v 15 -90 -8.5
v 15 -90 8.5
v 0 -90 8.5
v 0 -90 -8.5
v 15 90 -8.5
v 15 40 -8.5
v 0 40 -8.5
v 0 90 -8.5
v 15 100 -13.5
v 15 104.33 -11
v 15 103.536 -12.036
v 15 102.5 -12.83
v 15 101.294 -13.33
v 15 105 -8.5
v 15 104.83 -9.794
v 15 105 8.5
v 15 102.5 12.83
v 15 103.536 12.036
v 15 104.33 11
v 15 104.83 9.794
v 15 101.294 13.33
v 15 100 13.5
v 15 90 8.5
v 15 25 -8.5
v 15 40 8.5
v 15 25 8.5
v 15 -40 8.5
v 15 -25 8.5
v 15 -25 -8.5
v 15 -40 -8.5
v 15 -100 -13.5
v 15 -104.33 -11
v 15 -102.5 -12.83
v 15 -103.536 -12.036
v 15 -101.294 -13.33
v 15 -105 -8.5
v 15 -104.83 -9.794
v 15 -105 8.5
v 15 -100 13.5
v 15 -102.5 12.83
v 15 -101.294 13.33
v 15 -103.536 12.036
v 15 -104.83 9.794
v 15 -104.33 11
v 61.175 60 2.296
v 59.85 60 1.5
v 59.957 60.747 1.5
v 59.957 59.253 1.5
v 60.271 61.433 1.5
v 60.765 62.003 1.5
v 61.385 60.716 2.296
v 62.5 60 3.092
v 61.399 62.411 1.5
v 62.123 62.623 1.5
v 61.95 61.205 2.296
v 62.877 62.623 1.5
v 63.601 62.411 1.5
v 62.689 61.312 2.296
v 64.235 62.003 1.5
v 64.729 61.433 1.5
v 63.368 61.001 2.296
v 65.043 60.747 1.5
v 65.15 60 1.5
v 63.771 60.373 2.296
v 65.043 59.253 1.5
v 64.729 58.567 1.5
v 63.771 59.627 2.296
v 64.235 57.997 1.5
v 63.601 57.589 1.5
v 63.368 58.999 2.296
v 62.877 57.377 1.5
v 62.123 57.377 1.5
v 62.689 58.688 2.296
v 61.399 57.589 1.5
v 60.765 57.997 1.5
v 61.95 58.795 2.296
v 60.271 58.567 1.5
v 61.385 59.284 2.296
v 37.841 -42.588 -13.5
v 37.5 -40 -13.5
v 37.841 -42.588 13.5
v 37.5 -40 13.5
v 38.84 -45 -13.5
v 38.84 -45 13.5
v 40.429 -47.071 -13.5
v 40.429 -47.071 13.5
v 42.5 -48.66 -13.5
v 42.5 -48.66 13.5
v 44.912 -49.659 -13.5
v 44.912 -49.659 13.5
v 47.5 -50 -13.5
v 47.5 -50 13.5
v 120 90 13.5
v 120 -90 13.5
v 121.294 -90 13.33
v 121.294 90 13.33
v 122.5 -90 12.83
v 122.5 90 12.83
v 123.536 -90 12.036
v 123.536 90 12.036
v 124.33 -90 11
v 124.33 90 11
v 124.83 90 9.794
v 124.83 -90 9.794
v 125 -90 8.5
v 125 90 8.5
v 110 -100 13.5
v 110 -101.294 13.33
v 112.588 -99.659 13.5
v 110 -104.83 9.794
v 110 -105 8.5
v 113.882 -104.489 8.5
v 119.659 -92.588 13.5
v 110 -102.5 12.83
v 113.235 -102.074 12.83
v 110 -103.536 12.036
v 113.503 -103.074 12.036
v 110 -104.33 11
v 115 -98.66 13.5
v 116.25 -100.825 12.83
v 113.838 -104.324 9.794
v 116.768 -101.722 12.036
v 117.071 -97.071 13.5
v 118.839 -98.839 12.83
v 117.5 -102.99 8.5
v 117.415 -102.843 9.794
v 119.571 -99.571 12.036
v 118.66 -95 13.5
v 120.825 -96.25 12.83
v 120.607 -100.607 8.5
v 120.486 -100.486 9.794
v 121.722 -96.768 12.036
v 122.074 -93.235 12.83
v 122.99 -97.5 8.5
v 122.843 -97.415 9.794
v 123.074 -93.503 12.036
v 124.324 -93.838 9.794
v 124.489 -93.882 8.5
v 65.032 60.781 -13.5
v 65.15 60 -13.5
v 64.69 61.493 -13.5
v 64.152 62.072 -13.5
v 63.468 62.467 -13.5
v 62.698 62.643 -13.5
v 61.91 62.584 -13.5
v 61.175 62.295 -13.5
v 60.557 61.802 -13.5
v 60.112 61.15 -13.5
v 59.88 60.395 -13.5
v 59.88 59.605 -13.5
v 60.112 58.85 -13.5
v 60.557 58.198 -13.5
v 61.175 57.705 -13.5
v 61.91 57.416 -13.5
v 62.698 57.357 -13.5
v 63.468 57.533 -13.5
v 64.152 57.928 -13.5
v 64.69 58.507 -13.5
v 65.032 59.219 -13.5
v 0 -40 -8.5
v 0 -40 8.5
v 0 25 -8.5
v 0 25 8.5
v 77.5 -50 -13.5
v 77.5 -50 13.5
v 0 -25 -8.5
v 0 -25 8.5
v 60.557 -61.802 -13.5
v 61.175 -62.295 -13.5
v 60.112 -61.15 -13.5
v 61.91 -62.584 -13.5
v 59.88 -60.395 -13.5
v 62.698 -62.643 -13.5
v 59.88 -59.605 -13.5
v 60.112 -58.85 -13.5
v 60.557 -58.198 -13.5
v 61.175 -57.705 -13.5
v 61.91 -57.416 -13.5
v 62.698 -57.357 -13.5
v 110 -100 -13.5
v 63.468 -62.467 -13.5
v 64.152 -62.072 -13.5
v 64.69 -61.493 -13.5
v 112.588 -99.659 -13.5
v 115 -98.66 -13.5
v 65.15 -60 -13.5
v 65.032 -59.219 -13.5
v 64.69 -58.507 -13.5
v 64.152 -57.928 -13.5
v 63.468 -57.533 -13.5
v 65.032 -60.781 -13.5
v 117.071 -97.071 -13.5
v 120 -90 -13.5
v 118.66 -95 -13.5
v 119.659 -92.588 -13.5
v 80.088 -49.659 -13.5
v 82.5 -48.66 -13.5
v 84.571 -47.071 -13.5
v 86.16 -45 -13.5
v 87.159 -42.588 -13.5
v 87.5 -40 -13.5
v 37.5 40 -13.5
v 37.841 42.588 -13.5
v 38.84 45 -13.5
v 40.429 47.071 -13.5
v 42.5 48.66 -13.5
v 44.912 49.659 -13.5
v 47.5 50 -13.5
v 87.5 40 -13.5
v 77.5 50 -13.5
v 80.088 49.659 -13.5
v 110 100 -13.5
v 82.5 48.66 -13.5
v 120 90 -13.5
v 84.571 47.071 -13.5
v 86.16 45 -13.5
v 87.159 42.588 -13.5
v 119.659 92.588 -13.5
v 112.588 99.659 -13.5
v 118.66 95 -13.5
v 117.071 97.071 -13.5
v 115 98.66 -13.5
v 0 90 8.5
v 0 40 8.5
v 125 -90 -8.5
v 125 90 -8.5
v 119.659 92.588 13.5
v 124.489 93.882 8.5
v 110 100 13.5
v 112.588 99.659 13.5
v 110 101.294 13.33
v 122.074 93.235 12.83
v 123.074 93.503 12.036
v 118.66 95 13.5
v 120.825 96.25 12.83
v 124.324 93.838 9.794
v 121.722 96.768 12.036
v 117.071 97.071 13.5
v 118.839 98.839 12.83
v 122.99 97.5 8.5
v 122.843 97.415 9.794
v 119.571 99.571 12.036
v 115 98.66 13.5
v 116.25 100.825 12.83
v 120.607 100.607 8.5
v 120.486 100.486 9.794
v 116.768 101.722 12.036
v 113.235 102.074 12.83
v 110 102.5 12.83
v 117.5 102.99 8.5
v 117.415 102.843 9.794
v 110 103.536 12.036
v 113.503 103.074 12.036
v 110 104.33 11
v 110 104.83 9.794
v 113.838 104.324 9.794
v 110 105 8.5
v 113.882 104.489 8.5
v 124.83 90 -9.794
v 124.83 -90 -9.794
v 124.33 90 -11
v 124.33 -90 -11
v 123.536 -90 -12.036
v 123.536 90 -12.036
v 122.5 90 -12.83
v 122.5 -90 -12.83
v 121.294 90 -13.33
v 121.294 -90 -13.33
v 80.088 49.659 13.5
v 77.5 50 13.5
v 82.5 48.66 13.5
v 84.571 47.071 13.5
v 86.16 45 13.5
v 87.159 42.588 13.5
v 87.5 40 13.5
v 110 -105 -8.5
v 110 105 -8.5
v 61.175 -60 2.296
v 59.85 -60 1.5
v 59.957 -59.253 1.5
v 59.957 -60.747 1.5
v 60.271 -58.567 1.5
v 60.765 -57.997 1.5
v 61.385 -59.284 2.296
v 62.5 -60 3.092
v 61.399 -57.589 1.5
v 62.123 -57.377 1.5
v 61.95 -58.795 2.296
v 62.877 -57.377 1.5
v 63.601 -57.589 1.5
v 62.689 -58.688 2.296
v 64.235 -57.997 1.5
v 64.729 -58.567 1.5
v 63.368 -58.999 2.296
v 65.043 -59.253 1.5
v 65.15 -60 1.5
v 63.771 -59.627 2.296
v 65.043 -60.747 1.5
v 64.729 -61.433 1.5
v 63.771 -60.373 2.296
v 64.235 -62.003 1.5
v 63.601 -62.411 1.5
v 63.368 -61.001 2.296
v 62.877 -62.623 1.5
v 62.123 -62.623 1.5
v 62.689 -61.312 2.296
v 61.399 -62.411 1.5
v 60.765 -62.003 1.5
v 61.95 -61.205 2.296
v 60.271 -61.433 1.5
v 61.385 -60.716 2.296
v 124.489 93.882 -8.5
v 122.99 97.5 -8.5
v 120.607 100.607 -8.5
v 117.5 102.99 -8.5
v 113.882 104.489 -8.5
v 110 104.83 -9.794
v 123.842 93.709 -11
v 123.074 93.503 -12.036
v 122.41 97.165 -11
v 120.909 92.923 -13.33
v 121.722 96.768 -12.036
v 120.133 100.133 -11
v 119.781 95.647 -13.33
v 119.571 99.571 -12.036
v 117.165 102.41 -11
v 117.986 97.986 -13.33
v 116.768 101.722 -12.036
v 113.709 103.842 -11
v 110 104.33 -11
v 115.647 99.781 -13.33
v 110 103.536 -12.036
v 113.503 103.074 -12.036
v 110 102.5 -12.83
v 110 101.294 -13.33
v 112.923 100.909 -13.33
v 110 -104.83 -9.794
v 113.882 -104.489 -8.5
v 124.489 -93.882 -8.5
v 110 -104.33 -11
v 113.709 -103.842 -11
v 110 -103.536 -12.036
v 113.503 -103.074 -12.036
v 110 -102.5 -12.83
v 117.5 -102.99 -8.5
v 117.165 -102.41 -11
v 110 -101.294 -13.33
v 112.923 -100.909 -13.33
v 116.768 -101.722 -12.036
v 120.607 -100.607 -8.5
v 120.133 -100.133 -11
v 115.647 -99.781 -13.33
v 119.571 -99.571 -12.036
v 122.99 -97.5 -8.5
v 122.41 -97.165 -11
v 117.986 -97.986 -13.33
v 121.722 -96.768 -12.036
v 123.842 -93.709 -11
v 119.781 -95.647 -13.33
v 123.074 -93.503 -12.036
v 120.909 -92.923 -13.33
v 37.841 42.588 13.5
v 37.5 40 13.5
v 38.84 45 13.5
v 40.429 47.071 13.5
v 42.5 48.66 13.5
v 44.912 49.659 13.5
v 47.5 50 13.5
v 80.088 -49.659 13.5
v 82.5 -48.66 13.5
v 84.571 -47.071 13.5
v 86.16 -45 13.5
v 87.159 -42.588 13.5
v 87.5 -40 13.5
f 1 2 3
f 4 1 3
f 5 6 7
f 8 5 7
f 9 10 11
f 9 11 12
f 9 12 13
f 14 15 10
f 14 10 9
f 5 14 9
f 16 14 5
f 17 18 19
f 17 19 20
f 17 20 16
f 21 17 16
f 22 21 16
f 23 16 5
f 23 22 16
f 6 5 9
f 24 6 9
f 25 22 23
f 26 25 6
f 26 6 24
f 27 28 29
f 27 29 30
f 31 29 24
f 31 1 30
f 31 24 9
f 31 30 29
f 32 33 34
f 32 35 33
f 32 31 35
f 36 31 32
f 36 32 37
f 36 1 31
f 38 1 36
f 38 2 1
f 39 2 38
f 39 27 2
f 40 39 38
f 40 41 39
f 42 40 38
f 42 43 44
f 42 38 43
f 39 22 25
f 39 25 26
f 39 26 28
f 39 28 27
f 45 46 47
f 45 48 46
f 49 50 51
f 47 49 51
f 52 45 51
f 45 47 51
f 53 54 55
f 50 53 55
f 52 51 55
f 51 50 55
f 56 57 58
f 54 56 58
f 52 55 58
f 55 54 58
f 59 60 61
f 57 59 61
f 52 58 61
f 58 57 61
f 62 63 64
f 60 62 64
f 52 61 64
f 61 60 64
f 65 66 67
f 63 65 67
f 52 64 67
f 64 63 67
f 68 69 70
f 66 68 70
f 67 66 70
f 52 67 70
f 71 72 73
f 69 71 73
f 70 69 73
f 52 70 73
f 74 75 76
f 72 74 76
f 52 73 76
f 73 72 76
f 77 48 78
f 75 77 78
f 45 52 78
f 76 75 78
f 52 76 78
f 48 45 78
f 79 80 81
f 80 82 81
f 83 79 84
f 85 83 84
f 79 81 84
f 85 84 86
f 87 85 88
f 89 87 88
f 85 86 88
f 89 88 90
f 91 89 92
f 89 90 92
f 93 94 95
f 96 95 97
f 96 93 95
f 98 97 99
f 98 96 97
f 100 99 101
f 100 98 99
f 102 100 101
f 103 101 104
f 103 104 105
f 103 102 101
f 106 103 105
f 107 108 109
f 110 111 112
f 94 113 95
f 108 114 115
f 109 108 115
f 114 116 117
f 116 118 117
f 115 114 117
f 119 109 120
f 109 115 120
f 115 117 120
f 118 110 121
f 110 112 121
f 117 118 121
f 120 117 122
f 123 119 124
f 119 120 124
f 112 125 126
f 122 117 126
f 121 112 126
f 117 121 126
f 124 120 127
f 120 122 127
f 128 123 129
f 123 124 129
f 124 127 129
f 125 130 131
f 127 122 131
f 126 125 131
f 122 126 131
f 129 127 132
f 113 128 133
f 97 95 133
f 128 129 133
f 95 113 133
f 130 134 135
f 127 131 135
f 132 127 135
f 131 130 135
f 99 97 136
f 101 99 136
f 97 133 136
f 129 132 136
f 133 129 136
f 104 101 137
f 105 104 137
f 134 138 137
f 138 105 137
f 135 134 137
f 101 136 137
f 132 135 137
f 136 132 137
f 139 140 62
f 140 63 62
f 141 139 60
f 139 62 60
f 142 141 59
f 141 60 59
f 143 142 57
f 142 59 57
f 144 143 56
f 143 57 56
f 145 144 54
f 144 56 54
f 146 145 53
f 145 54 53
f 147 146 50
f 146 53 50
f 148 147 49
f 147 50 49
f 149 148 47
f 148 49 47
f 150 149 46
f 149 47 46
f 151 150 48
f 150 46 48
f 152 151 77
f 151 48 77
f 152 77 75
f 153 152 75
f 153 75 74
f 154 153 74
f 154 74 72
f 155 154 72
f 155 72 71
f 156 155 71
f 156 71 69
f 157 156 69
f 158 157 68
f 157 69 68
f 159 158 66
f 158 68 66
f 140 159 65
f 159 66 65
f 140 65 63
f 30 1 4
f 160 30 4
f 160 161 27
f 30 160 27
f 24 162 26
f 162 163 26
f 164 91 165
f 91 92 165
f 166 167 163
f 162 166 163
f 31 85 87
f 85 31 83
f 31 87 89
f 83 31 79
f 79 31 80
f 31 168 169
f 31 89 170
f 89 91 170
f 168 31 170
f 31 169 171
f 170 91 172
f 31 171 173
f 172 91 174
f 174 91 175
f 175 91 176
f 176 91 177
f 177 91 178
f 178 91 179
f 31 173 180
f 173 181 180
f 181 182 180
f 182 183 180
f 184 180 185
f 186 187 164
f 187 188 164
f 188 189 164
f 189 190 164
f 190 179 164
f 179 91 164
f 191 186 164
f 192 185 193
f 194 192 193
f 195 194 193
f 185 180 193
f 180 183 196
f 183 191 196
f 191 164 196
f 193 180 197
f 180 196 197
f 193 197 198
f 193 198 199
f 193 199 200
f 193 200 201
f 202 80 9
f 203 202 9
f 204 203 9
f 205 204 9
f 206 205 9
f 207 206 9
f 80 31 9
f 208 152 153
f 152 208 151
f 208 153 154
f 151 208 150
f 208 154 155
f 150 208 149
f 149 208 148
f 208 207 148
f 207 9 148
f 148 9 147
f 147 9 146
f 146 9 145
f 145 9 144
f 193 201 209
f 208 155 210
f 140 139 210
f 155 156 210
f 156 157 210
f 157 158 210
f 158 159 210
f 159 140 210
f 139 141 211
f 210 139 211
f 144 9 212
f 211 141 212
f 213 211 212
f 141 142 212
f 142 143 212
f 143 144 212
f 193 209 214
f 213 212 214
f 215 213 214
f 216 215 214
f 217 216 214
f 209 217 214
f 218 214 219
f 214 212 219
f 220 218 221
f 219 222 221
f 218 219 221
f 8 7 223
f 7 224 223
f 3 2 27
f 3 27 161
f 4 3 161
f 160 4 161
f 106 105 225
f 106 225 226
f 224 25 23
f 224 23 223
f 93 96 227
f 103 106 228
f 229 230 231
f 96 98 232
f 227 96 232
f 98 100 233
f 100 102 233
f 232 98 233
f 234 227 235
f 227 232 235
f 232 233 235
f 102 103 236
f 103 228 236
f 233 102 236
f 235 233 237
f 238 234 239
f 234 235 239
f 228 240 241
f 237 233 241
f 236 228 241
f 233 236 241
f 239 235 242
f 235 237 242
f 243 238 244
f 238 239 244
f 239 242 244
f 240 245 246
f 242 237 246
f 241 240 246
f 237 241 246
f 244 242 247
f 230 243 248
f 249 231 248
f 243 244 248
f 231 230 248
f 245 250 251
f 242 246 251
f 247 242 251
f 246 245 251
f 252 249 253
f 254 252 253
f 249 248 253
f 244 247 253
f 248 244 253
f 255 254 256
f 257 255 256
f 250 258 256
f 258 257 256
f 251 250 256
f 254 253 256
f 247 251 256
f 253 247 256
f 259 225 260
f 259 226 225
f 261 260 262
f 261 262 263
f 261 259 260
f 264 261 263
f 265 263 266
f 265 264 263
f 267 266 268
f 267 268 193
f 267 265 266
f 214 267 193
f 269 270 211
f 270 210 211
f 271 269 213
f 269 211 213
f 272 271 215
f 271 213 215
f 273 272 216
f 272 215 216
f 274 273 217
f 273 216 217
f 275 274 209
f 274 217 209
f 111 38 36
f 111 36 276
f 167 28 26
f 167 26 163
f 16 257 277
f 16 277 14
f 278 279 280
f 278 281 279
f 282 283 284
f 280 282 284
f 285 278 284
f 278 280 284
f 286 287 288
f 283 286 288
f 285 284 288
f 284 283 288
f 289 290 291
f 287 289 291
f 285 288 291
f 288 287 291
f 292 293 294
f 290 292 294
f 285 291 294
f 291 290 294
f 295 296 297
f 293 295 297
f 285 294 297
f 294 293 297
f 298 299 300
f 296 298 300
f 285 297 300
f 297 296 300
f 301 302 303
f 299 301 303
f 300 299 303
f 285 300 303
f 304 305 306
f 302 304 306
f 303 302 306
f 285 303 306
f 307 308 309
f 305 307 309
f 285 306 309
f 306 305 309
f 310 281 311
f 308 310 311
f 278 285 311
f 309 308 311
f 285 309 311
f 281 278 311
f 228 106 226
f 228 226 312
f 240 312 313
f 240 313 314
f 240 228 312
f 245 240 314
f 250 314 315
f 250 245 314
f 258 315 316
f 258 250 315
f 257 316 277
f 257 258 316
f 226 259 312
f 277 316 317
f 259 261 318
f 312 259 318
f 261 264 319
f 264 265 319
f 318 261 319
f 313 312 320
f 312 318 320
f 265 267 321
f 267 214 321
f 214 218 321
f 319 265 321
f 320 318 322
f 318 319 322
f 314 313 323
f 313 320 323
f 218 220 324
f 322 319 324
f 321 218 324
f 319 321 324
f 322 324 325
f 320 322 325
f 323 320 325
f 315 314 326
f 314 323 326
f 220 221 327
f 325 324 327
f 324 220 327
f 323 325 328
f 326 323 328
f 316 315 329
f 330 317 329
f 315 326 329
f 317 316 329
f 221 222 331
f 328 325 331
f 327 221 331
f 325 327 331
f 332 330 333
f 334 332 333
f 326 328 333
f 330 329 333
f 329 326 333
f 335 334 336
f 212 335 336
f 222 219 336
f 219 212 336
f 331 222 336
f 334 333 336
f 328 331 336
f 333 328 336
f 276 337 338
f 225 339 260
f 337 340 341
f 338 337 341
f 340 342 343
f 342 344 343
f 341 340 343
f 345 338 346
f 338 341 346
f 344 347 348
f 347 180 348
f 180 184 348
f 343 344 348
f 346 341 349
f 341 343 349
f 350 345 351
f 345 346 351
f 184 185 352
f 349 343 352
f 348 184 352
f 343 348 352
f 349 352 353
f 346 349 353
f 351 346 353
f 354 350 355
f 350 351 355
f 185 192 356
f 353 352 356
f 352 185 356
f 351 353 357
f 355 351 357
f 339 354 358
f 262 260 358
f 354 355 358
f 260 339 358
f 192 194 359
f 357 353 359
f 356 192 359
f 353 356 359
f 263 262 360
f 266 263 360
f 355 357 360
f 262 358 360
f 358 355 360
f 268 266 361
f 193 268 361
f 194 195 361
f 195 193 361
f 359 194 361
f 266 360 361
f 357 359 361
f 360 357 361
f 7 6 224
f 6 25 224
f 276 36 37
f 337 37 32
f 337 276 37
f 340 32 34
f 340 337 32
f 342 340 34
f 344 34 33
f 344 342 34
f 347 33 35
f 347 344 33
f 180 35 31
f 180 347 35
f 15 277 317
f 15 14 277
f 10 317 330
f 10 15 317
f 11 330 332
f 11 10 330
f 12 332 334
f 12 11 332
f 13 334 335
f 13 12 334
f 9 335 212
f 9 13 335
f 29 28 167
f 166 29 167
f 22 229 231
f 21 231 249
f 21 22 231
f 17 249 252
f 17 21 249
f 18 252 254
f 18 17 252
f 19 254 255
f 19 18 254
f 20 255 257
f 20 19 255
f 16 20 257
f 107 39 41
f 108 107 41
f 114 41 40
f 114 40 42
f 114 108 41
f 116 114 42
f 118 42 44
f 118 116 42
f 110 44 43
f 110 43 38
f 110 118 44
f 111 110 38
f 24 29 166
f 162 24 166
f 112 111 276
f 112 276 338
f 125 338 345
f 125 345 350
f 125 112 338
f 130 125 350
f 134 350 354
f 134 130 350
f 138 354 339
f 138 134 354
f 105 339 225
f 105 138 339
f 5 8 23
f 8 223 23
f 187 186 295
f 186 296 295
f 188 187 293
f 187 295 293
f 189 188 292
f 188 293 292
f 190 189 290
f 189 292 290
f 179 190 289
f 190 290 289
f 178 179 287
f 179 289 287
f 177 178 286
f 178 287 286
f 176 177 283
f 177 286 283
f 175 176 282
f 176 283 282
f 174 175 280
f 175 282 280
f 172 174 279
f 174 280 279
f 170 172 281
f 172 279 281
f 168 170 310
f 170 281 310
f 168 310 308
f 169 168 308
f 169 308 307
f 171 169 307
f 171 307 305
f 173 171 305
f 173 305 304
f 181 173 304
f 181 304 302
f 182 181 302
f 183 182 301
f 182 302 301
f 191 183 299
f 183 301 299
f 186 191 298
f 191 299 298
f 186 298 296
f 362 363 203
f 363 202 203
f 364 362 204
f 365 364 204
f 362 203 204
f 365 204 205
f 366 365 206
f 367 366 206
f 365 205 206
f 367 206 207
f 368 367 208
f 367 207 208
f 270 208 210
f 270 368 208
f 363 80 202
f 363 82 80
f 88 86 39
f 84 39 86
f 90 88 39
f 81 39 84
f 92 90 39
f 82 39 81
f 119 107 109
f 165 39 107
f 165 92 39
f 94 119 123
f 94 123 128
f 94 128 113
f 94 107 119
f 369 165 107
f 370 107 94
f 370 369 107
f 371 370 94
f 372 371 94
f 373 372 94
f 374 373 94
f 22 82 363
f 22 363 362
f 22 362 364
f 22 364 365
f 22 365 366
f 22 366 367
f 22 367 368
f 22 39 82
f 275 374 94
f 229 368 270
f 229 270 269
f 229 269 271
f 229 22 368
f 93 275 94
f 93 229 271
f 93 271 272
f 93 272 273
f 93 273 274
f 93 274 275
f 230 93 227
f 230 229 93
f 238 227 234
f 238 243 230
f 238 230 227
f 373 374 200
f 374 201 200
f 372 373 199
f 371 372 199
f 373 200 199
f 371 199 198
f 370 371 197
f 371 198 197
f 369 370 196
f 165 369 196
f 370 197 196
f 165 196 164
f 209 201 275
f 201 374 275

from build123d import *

# Parameters (mm, degrees)
SKETCH1_W                = 50
SKETCH1_H                = 100
BOSS_EXTRUDE4_DEPTH      = 8.5
SKETCH2_W                = 50
SKETCH2_H                = 100
BOSS_EXTRUDE5_DEPTH      = 5
BOSS_EXTRUDE6_START      = 5
SKETCH3_W                = 50
SKETCH3_H                = 100
BOSS_EXTRUDE6_DEPTH      = 5
FILLET3_R                = 10
M5_CLEARANCE_HOLE1_D     = 5.3
M5_CLEARANCE_HOLE1_DEPTH = 15
M5_CLEARANCE_HOLE1_TIP   = 1.59228064
FILLET2_R                = 5


with BuildPart() as part:
    # Sketch1 → Boss-Extrude4 (new, symmetric)
    with BuildSketch(Plane.XY):
        with BuildLine():
            Line((0, -25), (0, 25))
            Line((0, 25), (15, 25))
            Line((15, 25), (15, 40))
            Line((15, 40), (0, 40))
            Line((0, 40), (0, 90))
            Line((0, 90), (15, 90))
            Line((15, 90), (15, 105))
            Line((15, 105), (110, 105))
            ThreePointArc((110, 105), (120.606601718, 100.606601718), (125, 90))
            Line((125, 90), (125, -90))
            ThreePointArc((125, -90), (120.606601718, -100.606601718), (110, -105))
            Line((110, -105), (15, -105))
            Line((15, -105), (15, -90))
            Line((15, -90), (0, -90))
            Line((0, -90), (0, -40))
            Line((0, -40), (15, -40))
            Line((15, -40), (15, -25))
            Line((15, -25), (0, -25))
        make_face()
        with Locations((62.5, 0)):
            Rectangle(SKETCH1_W, SKETCH1_H, mode=Mode.SUBTRACT)
    extrude(amount=BOSS_EXTRUDE4_DEPTH, both=True)

    # Sketch2 → Boss-Extrude5 (add)
    with BuildSketch(Plane(origin=(0, 0, -8.5), x_dir=(-1, 0, 0), z_dir=(0, 0, -1))):
        with BuildLine():
            Line((-110, 105), (-15, 105))
            Line((-15, 105), (-15, 90))
            Line((-15, 90), (-15, 40))
            Line((-15, 40), (-15, 25))
            Line((-15, 25), (-15, -25))
            Line((-15, -25), (-15, -40))
            Line((-15, -40), (-15, -90))
            Line((-15, -90), (-15, -105))
            Line((-15, -105), (-110, -105))
            ThreePointArc((-110, -105), (-120.606601718, -100.606601718), (-125, -90))
            Line((-125, -90), (-125, 90))
            ThreePointArc((-125, 90), (-120.606601718, 100.606601718), (-110, 105))
        make_face()
        with Locations((-62.5, 0)):
            Rectangle(SKETCH2_W, SKETCH2_H, mode=Mode.SUBTRACT)
    extrude(amount=BOSS_EXTRUDE5_DEPTH)

    # Sketch3 → Boss-Extrude6 (add)
    with BuildSketch(Plane.XY.offset(8.5).offset(BOSS_EXTRUDE6_START)):
        with BuildLine():
            Line((15, -90), (15, -105))
            Line((15, -105), (110, -105))
            ThreePointArc((110, -105), (120.606601718, -100.606601718), (125, -90))
            Line((125, -90), (125, 90))
            ThreePointArc((125, 90), (120.606601718, 100.606601718), (110, 105))
            Line((110, 105), (15, 105))
            Line((15, 105), (15, 90))
            Line((15, 90), (15, 40))
            Line((15, 40), (15, 25))
            Line((15, 25), (15, -25))
            Line((15, -25), (15, -40))
            Line((15, -40), (15, -90))
        make_face()
        with Locations((62.5, 0)):
            Rectangle(SKETCH3_W, SKETCH3_H, mode=Mode.SUBTRACT)
    extrude(amount=-BOSS_EXTRUDE6_DEPTH)

    # Fillet3
    fillet3_edges = [part.edges().sort_by_distance(p)[0] for p in [
        (37.5, 50, 0),
        (37.5, -50, 0),
        (87.5, -50, 0),
        (87.5, 50, 0),
    ]]
    fillet(fillet3_edges, radius=FILLET3_R)

    # M5 Clearance Hole1
    with Locations(Plane(origin=(62.5, 60, -13.5), x_dir=(-1, 0, 0), z_dir=(0, 0, -1))):
        with Locations((0, 0), (0, -120)):
            Hole(M5_CLEARANCE_HOLE1_D / 2, depth=M5_CLEARANCE_HOLE1_DEPTH)
            with Locations((0, 0, -(M5_CLEARANCE_HOLE1_DEPTH + M5_CLEARANCE_HOLE1_TIP / 2))):  # 118° drill point
                Cone(0, M5_CLEARANCE_HOLE1_D / 2, M5_CLEARANCE_HOLE1_TIP, mode=Mode.SUBTRACT)

    # Fillet2
    fillet2_edges = [part.edges().sort_by_distance(p)[0] for p in [
        (62.5, -105, 13.5),
        (120.606601718, -100.606601718, 13.5),
        (125, 0, 13.5),
        (120.606601718, 100.606601718, 13.5),
        (62.5, 105, 13.5),
        (120.606601718, 100.606601718, -13.5),
        (125, 0, -13.5),
        (120.606601718, -100.606601718, -13.5),
        (62.5, -105, -13.5),
        (62.5, 105, -13.5),
    ]]
    fillet(fillet2_edges, radius=FILLET2_R)


solid = part.part
